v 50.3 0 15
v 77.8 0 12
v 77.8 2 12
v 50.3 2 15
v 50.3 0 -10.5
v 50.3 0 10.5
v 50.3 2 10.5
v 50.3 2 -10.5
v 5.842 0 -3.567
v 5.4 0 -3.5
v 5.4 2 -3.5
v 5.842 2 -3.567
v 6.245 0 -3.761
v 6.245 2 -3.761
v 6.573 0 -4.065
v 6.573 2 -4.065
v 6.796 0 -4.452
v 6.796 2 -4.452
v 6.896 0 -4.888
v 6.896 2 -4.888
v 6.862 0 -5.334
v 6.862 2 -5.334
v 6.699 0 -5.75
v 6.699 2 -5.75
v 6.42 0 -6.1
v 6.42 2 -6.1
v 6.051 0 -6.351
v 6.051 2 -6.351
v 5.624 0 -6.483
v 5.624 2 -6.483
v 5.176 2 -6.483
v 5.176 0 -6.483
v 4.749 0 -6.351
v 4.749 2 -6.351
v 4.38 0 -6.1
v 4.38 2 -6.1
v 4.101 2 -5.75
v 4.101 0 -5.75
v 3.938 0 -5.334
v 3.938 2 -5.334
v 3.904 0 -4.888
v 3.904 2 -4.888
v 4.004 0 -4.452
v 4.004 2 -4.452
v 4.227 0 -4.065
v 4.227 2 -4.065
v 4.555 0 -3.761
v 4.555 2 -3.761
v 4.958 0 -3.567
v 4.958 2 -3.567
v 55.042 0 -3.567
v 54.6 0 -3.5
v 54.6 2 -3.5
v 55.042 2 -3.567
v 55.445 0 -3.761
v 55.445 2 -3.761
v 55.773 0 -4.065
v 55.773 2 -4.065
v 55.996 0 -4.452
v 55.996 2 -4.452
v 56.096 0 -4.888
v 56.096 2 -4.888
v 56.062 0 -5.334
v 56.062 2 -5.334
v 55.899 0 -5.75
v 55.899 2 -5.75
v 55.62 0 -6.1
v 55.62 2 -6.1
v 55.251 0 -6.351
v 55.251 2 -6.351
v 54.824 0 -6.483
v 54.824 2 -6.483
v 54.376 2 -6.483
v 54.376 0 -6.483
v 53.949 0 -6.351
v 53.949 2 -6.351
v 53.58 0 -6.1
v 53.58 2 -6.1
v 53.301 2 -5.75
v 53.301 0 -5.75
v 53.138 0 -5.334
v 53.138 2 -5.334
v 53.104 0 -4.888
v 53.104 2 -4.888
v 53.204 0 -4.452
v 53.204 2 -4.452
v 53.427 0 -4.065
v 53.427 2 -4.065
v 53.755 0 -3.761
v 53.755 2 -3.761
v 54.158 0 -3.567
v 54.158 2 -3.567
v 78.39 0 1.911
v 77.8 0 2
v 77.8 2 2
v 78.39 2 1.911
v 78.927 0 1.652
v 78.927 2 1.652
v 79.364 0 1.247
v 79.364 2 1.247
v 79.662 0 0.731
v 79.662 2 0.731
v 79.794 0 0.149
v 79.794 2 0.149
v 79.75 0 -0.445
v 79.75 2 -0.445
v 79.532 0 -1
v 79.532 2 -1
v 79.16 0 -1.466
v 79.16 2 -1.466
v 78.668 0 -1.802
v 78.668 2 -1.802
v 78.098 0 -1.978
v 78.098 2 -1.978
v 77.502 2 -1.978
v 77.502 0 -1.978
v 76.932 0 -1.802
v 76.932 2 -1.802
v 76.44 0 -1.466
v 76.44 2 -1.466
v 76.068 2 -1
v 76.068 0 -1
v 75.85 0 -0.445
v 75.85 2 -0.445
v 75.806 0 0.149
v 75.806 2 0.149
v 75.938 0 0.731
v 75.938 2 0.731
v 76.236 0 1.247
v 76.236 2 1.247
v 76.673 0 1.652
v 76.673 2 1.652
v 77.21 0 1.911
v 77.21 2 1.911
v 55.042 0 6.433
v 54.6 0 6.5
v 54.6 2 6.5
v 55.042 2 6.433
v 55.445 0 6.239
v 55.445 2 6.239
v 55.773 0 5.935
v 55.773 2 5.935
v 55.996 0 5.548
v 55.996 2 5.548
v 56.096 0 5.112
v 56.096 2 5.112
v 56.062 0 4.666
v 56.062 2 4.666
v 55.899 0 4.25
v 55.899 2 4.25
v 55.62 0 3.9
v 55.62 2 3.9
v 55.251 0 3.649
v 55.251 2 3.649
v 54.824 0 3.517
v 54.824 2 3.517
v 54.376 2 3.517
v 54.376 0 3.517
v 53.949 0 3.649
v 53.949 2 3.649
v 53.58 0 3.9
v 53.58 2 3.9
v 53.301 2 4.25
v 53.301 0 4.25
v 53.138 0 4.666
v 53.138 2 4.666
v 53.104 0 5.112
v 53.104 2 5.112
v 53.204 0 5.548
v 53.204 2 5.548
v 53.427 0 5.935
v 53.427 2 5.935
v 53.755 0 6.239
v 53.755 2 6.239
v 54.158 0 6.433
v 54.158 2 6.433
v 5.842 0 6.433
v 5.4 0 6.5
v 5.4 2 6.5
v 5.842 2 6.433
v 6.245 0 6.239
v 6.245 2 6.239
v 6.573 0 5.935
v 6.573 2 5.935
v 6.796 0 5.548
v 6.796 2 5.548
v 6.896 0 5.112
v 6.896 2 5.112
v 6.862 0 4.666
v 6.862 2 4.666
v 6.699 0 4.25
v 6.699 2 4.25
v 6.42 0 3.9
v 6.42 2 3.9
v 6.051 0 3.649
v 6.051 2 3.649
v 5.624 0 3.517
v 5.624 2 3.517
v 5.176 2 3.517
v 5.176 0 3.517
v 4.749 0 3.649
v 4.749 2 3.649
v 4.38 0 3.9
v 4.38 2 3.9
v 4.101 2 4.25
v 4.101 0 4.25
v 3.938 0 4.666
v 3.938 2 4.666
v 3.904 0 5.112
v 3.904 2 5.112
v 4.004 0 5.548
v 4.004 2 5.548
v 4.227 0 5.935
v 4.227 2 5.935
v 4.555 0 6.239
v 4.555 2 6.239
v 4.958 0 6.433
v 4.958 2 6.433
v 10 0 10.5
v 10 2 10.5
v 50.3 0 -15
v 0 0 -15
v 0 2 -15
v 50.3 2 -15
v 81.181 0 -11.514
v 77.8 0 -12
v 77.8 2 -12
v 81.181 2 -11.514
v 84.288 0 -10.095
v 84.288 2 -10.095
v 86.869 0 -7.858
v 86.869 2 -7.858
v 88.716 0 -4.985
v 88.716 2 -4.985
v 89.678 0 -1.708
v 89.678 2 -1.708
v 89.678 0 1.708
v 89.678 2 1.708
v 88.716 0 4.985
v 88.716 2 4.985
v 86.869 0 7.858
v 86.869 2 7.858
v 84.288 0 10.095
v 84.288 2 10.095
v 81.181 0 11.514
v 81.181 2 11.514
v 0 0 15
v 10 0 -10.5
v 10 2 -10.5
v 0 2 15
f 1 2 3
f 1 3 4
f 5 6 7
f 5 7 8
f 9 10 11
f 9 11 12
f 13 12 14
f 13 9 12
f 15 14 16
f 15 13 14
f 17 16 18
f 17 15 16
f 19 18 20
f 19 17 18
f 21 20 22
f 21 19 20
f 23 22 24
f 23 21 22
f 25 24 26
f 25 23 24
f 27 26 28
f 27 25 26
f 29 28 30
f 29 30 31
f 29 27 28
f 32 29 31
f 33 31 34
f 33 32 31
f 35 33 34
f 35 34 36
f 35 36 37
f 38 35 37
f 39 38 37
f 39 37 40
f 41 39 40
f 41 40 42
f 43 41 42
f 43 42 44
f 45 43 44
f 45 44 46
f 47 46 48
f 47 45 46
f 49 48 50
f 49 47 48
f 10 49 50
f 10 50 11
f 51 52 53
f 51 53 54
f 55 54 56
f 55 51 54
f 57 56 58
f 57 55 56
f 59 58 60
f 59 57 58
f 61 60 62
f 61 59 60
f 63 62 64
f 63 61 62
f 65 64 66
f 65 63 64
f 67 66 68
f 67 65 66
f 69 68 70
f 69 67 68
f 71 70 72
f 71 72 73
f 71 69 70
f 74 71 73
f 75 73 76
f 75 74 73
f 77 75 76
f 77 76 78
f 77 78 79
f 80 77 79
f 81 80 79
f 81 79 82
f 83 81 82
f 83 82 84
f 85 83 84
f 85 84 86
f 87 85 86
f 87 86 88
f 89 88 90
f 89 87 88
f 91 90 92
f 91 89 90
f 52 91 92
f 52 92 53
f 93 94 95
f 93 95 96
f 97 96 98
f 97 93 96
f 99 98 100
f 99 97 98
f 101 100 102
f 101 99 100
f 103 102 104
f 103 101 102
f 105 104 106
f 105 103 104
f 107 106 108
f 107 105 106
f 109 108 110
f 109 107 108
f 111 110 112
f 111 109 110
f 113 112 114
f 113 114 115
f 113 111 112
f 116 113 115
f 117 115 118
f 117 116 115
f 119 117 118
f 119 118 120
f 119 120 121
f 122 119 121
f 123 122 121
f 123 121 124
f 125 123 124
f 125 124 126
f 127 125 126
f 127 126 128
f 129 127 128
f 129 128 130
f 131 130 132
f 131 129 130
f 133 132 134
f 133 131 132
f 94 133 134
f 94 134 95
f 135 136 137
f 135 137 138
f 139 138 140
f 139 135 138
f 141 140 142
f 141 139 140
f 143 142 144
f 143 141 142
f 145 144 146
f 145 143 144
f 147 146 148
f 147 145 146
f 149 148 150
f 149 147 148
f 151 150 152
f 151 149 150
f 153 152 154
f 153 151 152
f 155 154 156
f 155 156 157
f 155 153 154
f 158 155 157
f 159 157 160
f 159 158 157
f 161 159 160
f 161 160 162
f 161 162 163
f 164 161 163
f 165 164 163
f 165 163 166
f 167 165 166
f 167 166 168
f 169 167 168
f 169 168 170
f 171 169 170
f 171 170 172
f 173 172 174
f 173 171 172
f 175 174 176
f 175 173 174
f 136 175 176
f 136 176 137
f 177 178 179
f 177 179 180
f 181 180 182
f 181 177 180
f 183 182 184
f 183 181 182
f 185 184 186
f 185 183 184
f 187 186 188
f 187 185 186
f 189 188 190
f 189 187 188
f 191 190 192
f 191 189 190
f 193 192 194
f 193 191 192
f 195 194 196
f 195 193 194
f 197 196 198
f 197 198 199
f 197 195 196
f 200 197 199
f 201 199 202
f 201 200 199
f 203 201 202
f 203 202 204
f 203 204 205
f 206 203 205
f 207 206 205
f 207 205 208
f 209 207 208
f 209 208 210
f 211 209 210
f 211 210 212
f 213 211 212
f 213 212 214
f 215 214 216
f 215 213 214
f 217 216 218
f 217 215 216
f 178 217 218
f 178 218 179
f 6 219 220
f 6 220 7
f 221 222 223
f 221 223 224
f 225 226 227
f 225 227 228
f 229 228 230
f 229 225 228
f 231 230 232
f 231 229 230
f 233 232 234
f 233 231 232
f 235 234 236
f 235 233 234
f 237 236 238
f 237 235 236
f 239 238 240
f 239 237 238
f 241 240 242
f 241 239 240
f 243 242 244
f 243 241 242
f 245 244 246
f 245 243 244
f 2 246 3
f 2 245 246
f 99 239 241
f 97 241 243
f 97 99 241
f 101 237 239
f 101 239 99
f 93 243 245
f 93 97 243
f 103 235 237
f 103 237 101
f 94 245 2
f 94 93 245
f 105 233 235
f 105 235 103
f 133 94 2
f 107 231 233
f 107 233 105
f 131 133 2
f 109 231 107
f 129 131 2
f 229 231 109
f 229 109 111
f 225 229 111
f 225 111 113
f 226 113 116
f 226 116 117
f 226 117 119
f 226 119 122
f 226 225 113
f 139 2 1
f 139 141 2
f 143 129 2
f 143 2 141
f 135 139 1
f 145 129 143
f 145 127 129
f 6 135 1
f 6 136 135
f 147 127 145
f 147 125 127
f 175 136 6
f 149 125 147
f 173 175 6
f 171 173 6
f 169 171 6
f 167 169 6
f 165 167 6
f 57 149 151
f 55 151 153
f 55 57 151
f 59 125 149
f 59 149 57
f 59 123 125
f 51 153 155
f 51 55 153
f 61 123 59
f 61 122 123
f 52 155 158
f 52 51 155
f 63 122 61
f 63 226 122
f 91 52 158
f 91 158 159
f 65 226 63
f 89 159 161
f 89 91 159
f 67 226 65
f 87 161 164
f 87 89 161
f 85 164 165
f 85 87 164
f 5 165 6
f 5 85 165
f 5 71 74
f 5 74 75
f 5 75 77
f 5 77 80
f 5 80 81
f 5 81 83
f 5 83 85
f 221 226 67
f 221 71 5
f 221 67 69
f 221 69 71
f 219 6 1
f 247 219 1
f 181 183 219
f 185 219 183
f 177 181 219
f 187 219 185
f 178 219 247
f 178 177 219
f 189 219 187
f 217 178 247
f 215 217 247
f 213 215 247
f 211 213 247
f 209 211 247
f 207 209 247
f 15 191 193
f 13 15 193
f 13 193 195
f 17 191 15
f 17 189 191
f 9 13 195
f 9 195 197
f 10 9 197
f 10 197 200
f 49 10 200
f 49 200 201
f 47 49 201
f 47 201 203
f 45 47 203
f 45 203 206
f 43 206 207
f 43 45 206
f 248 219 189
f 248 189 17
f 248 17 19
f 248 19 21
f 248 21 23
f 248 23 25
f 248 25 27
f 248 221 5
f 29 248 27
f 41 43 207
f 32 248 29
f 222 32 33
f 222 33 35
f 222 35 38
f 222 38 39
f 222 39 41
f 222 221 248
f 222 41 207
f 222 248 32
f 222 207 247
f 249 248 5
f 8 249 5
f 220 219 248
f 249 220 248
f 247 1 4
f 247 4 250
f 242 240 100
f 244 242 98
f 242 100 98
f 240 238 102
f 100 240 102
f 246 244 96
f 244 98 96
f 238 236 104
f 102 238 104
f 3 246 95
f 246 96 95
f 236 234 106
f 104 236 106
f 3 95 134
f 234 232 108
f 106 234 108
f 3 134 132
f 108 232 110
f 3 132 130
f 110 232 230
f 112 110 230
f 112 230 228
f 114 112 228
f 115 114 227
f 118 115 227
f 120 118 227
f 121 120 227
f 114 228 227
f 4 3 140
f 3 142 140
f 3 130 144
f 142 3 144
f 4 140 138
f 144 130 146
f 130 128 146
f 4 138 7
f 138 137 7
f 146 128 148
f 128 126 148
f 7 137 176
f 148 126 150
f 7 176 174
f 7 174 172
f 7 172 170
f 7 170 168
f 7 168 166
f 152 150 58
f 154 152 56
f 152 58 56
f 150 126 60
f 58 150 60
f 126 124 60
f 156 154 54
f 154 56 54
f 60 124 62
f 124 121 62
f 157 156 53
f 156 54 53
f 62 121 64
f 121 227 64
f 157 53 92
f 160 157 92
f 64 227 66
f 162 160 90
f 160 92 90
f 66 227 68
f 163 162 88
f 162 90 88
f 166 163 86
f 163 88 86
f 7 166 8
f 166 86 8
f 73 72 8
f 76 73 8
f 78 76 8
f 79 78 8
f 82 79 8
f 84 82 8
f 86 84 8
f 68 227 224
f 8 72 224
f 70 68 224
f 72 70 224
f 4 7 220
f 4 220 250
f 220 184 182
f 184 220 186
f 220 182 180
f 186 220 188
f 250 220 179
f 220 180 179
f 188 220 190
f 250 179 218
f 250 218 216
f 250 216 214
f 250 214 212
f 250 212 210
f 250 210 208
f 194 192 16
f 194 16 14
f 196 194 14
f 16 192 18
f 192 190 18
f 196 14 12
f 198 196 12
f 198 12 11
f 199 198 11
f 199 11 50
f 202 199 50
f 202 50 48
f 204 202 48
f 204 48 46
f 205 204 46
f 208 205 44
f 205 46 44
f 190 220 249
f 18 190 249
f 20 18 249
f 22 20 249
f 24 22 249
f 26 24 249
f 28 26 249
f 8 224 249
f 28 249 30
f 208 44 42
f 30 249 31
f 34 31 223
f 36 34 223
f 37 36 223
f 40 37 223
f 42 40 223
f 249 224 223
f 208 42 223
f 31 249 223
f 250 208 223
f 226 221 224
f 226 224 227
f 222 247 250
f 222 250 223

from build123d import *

# Parameters (mm, degrees)
SKETCH_1_R         = 1.5
SKETCH_1_R_2       = 2
SKETCH_1_W         = 40.3
SKETCH_1_H         = 21
EXTRUDE_1090_DEPTH = 2


with BuildPart() as part:
    # Эскиз1 → Extrude 1090 (new body)
    with BuildSketch(Plane(origin=(0, 0, 0), x_dir=(1, 0, 0), z_dir=(0, 1, 0))):
        with BuildLine():
            Line((0, 15), (50.3, 15))
            Line((50.3, 15), (77.8, 12))
            ThreePointArc((77.8, 12), (89.8, 0), (77.8, -12))
            Line((77.8, -12), (50.3, -15))
            Line((50.3, -15), (0, -15))
            Line((0, -15), (0, 15))
        make_face()
        with Locations(Location((5.4, -5, 0), (0, 0, 270))):
            Circle(SKETCH_1_R, mode=Mode.SUBTRACT)
        with Locations(Location((5.4, 5, 0), (0, 0, 270))):
            Circle(SKETCH_1_R, mode=Mode.SUBTRACT)
        with Locations(Location((54.6, -5, 0), (0, 0, 270))):
            Circle(SKETCH_1_R, mode=Mode.SUBTRACT)
        with Locations(Location((54.6, 5, 0), (0, 0, 270))):
            Circle(SKETCH_1_R, mode=Mode.SUBTRACT)
        with Locations(Location((77.8, 0, 0), (0, 0, 270))):
            Circle(SKETCH_1_R_2, mode=Mode.SUBTRACT)
        with Locations((30.15, 0)):
            Rectangle(SKETCH_1_W, SKETCH_1_H, mode=Mode.SUBTRACT)
    extrude(amount=EXTRUDE_1090_DEPTH)


solid = part.part
